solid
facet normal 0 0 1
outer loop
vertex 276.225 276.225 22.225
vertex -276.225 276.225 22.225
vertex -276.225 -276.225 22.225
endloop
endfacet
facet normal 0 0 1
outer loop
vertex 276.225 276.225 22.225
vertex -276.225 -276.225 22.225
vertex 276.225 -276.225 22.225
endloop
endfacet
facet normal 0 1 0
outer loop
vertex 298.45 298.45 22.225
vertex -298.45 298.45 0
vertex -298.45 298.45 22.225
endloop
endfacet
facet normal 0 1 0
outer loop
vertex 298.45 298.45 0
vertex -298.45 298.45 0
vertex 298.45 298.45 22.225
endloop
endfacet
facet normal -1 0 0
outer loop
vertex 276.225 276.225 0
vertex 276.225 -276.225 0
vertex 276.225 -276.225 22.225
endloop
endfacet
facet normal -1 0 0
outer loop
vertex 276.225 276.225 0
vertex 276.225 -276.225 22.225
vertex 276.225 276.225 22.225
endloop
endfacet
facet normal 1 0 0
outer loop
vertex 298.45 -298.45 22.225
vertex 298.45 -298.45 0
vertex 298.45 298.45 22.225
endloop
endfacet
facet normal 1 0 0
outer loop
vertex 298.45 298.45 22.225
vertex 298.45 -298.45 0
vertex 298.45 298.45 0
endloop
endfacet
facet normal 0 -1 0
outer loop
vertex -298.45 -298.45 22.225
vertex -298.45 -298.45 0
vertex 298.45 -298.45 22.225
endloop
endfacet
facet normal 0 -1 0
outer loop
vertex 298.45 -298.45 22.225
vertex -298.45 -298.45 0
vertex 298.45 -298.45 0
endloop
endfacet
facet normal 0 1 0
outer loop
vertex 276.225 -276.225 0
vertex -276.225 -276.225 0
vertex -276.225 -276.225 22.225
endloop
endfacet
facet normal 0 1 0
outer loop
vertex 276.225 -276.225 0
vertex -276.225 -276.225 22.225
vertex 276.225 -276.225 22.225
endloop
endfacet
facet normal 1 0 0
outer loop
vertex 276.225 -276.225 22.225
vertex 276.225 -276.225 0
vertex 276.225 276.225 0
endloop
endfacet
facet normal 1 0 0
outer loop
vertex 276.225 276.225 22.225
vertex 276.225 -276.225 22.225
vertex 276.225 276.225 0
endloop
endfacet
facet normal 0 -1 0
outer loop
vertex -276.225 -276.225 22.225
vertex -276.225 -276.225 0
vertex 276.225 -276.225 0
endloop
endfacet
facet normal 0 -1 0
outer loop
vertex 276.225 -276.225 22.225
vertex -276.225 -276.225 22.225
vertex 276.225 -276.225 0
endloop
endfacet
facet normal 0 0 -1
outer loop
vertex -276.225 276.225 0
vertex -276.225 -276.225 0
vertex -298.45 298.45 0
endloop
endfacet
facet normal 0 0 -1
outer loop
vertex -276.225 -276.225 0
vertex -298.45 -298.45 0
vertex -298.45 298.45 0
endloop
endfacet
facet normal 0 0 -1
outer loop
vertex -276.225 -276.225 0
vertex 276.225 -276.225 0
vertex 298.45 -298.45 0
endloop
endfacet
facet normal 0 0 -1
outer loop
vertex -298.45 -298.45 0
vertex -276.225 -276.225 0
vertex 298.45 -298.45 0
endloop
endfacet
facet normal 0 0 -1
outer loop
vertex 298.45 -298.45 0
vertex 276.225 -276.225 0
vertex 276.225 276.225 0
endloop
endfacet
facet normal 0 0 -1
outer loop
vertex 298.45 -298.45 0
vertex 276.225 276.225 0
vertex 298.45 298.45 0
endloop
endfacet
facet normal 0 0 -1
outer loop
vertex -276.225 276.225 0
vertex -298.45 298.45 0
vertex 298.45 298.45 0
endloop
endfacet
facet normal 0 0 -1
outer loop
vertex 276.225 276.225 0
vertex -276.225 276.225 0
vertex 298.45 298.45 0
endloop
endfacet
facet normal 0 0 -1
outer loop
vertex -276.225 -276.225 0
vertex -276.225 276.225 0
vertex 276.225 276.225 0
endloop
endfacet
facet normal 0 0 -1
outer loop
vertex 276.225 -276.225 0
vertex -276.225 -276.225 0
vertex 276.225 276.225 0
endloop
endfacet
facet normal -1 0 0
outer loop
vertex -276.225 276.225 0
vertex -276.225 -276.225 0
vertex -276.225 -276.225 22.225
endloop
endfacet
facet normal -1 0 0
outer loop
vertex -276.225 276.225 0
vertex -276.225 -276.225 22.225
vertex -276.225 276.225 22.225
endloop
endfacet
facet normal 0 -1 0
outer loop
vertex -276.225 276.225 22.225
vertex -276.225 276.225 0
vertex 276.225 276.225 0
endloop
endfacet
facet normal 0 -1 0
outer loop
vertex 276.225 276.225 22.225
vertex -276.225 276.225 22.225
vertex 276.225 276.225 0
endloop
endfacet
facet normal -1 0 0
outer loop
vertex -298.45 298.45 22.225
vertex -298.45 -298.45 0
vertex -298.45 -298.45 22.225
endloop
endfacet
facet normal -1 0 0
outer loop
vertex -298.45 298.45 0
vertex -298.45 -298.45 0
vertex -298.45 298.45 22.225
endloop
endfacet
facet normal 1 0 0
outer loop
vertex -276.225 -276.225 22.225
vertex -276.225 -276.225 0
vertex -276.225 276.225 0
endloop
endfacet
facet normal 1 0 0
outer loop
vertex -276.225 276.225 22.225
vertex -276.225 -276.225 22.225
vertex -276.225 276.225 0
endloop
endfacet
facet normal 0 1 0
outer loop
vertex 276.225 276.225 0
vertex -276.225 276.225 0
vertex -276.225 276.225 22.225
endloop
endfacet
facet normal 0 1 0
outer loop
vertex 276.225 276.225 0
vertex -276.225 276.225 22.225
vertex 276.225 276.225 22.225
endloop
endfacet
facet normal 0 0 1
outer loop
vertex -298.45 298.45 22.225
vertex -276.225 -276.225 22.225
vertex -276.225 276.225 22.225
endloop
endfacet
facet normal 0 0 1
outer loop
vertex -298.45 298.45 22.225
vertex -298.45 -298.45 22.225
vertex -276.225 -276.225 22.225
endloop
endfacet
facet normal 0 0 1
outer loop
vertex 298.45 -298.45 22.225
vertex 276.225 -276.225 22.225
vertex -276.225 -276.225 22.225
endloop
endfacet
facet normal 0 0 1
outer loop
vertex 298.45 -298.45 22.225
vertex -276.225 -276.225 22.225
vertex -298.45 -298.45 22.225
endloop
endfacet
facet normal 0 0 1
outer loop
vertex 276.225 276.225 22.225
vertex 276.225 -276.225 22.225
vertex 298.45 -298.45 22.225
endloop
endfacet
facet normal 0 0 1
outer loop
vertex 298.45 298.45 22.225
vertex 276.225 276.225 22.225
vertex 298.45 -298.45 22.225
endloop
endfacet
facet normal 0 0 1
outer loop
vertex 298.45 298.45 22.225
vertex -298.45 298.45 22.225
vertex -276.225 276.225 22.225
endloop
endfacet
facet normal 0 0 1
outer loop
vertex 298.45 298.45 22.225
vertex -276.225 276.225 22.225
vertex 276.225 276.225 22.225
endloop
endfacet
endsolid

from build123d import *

# Parameters (mm, degrees)
F0_W     = 596.9
F0_H     = 596.9
F0_W_2   = 552.45
F0_H_2   = 552.45
F1_DEPTH = 22.225
F2_W     = 552.45
F2_H     = 552.45
F3_DEPTH = 22.225


with BuildPart() as f1:
    # F0 (on Top) → F1 (new body)
    with BuildSketch(Plane.XY):
        Rectangle(F0_W, F0_H)
        Rectangle(F0_W_2, F0_H_2, mode=Mode.SUBTRACT)
    extrude(amount=F1_DEPTH)


with BuildPart() as f3:
    # F2 (on Top) → F3 (new body)
    with BuildSketch(Plane.XY):
        Rectangle(F2_W, F2_H)
    extrude(amount=F3_DEPTH)


solid = Compound([f1.part, f3.part])
